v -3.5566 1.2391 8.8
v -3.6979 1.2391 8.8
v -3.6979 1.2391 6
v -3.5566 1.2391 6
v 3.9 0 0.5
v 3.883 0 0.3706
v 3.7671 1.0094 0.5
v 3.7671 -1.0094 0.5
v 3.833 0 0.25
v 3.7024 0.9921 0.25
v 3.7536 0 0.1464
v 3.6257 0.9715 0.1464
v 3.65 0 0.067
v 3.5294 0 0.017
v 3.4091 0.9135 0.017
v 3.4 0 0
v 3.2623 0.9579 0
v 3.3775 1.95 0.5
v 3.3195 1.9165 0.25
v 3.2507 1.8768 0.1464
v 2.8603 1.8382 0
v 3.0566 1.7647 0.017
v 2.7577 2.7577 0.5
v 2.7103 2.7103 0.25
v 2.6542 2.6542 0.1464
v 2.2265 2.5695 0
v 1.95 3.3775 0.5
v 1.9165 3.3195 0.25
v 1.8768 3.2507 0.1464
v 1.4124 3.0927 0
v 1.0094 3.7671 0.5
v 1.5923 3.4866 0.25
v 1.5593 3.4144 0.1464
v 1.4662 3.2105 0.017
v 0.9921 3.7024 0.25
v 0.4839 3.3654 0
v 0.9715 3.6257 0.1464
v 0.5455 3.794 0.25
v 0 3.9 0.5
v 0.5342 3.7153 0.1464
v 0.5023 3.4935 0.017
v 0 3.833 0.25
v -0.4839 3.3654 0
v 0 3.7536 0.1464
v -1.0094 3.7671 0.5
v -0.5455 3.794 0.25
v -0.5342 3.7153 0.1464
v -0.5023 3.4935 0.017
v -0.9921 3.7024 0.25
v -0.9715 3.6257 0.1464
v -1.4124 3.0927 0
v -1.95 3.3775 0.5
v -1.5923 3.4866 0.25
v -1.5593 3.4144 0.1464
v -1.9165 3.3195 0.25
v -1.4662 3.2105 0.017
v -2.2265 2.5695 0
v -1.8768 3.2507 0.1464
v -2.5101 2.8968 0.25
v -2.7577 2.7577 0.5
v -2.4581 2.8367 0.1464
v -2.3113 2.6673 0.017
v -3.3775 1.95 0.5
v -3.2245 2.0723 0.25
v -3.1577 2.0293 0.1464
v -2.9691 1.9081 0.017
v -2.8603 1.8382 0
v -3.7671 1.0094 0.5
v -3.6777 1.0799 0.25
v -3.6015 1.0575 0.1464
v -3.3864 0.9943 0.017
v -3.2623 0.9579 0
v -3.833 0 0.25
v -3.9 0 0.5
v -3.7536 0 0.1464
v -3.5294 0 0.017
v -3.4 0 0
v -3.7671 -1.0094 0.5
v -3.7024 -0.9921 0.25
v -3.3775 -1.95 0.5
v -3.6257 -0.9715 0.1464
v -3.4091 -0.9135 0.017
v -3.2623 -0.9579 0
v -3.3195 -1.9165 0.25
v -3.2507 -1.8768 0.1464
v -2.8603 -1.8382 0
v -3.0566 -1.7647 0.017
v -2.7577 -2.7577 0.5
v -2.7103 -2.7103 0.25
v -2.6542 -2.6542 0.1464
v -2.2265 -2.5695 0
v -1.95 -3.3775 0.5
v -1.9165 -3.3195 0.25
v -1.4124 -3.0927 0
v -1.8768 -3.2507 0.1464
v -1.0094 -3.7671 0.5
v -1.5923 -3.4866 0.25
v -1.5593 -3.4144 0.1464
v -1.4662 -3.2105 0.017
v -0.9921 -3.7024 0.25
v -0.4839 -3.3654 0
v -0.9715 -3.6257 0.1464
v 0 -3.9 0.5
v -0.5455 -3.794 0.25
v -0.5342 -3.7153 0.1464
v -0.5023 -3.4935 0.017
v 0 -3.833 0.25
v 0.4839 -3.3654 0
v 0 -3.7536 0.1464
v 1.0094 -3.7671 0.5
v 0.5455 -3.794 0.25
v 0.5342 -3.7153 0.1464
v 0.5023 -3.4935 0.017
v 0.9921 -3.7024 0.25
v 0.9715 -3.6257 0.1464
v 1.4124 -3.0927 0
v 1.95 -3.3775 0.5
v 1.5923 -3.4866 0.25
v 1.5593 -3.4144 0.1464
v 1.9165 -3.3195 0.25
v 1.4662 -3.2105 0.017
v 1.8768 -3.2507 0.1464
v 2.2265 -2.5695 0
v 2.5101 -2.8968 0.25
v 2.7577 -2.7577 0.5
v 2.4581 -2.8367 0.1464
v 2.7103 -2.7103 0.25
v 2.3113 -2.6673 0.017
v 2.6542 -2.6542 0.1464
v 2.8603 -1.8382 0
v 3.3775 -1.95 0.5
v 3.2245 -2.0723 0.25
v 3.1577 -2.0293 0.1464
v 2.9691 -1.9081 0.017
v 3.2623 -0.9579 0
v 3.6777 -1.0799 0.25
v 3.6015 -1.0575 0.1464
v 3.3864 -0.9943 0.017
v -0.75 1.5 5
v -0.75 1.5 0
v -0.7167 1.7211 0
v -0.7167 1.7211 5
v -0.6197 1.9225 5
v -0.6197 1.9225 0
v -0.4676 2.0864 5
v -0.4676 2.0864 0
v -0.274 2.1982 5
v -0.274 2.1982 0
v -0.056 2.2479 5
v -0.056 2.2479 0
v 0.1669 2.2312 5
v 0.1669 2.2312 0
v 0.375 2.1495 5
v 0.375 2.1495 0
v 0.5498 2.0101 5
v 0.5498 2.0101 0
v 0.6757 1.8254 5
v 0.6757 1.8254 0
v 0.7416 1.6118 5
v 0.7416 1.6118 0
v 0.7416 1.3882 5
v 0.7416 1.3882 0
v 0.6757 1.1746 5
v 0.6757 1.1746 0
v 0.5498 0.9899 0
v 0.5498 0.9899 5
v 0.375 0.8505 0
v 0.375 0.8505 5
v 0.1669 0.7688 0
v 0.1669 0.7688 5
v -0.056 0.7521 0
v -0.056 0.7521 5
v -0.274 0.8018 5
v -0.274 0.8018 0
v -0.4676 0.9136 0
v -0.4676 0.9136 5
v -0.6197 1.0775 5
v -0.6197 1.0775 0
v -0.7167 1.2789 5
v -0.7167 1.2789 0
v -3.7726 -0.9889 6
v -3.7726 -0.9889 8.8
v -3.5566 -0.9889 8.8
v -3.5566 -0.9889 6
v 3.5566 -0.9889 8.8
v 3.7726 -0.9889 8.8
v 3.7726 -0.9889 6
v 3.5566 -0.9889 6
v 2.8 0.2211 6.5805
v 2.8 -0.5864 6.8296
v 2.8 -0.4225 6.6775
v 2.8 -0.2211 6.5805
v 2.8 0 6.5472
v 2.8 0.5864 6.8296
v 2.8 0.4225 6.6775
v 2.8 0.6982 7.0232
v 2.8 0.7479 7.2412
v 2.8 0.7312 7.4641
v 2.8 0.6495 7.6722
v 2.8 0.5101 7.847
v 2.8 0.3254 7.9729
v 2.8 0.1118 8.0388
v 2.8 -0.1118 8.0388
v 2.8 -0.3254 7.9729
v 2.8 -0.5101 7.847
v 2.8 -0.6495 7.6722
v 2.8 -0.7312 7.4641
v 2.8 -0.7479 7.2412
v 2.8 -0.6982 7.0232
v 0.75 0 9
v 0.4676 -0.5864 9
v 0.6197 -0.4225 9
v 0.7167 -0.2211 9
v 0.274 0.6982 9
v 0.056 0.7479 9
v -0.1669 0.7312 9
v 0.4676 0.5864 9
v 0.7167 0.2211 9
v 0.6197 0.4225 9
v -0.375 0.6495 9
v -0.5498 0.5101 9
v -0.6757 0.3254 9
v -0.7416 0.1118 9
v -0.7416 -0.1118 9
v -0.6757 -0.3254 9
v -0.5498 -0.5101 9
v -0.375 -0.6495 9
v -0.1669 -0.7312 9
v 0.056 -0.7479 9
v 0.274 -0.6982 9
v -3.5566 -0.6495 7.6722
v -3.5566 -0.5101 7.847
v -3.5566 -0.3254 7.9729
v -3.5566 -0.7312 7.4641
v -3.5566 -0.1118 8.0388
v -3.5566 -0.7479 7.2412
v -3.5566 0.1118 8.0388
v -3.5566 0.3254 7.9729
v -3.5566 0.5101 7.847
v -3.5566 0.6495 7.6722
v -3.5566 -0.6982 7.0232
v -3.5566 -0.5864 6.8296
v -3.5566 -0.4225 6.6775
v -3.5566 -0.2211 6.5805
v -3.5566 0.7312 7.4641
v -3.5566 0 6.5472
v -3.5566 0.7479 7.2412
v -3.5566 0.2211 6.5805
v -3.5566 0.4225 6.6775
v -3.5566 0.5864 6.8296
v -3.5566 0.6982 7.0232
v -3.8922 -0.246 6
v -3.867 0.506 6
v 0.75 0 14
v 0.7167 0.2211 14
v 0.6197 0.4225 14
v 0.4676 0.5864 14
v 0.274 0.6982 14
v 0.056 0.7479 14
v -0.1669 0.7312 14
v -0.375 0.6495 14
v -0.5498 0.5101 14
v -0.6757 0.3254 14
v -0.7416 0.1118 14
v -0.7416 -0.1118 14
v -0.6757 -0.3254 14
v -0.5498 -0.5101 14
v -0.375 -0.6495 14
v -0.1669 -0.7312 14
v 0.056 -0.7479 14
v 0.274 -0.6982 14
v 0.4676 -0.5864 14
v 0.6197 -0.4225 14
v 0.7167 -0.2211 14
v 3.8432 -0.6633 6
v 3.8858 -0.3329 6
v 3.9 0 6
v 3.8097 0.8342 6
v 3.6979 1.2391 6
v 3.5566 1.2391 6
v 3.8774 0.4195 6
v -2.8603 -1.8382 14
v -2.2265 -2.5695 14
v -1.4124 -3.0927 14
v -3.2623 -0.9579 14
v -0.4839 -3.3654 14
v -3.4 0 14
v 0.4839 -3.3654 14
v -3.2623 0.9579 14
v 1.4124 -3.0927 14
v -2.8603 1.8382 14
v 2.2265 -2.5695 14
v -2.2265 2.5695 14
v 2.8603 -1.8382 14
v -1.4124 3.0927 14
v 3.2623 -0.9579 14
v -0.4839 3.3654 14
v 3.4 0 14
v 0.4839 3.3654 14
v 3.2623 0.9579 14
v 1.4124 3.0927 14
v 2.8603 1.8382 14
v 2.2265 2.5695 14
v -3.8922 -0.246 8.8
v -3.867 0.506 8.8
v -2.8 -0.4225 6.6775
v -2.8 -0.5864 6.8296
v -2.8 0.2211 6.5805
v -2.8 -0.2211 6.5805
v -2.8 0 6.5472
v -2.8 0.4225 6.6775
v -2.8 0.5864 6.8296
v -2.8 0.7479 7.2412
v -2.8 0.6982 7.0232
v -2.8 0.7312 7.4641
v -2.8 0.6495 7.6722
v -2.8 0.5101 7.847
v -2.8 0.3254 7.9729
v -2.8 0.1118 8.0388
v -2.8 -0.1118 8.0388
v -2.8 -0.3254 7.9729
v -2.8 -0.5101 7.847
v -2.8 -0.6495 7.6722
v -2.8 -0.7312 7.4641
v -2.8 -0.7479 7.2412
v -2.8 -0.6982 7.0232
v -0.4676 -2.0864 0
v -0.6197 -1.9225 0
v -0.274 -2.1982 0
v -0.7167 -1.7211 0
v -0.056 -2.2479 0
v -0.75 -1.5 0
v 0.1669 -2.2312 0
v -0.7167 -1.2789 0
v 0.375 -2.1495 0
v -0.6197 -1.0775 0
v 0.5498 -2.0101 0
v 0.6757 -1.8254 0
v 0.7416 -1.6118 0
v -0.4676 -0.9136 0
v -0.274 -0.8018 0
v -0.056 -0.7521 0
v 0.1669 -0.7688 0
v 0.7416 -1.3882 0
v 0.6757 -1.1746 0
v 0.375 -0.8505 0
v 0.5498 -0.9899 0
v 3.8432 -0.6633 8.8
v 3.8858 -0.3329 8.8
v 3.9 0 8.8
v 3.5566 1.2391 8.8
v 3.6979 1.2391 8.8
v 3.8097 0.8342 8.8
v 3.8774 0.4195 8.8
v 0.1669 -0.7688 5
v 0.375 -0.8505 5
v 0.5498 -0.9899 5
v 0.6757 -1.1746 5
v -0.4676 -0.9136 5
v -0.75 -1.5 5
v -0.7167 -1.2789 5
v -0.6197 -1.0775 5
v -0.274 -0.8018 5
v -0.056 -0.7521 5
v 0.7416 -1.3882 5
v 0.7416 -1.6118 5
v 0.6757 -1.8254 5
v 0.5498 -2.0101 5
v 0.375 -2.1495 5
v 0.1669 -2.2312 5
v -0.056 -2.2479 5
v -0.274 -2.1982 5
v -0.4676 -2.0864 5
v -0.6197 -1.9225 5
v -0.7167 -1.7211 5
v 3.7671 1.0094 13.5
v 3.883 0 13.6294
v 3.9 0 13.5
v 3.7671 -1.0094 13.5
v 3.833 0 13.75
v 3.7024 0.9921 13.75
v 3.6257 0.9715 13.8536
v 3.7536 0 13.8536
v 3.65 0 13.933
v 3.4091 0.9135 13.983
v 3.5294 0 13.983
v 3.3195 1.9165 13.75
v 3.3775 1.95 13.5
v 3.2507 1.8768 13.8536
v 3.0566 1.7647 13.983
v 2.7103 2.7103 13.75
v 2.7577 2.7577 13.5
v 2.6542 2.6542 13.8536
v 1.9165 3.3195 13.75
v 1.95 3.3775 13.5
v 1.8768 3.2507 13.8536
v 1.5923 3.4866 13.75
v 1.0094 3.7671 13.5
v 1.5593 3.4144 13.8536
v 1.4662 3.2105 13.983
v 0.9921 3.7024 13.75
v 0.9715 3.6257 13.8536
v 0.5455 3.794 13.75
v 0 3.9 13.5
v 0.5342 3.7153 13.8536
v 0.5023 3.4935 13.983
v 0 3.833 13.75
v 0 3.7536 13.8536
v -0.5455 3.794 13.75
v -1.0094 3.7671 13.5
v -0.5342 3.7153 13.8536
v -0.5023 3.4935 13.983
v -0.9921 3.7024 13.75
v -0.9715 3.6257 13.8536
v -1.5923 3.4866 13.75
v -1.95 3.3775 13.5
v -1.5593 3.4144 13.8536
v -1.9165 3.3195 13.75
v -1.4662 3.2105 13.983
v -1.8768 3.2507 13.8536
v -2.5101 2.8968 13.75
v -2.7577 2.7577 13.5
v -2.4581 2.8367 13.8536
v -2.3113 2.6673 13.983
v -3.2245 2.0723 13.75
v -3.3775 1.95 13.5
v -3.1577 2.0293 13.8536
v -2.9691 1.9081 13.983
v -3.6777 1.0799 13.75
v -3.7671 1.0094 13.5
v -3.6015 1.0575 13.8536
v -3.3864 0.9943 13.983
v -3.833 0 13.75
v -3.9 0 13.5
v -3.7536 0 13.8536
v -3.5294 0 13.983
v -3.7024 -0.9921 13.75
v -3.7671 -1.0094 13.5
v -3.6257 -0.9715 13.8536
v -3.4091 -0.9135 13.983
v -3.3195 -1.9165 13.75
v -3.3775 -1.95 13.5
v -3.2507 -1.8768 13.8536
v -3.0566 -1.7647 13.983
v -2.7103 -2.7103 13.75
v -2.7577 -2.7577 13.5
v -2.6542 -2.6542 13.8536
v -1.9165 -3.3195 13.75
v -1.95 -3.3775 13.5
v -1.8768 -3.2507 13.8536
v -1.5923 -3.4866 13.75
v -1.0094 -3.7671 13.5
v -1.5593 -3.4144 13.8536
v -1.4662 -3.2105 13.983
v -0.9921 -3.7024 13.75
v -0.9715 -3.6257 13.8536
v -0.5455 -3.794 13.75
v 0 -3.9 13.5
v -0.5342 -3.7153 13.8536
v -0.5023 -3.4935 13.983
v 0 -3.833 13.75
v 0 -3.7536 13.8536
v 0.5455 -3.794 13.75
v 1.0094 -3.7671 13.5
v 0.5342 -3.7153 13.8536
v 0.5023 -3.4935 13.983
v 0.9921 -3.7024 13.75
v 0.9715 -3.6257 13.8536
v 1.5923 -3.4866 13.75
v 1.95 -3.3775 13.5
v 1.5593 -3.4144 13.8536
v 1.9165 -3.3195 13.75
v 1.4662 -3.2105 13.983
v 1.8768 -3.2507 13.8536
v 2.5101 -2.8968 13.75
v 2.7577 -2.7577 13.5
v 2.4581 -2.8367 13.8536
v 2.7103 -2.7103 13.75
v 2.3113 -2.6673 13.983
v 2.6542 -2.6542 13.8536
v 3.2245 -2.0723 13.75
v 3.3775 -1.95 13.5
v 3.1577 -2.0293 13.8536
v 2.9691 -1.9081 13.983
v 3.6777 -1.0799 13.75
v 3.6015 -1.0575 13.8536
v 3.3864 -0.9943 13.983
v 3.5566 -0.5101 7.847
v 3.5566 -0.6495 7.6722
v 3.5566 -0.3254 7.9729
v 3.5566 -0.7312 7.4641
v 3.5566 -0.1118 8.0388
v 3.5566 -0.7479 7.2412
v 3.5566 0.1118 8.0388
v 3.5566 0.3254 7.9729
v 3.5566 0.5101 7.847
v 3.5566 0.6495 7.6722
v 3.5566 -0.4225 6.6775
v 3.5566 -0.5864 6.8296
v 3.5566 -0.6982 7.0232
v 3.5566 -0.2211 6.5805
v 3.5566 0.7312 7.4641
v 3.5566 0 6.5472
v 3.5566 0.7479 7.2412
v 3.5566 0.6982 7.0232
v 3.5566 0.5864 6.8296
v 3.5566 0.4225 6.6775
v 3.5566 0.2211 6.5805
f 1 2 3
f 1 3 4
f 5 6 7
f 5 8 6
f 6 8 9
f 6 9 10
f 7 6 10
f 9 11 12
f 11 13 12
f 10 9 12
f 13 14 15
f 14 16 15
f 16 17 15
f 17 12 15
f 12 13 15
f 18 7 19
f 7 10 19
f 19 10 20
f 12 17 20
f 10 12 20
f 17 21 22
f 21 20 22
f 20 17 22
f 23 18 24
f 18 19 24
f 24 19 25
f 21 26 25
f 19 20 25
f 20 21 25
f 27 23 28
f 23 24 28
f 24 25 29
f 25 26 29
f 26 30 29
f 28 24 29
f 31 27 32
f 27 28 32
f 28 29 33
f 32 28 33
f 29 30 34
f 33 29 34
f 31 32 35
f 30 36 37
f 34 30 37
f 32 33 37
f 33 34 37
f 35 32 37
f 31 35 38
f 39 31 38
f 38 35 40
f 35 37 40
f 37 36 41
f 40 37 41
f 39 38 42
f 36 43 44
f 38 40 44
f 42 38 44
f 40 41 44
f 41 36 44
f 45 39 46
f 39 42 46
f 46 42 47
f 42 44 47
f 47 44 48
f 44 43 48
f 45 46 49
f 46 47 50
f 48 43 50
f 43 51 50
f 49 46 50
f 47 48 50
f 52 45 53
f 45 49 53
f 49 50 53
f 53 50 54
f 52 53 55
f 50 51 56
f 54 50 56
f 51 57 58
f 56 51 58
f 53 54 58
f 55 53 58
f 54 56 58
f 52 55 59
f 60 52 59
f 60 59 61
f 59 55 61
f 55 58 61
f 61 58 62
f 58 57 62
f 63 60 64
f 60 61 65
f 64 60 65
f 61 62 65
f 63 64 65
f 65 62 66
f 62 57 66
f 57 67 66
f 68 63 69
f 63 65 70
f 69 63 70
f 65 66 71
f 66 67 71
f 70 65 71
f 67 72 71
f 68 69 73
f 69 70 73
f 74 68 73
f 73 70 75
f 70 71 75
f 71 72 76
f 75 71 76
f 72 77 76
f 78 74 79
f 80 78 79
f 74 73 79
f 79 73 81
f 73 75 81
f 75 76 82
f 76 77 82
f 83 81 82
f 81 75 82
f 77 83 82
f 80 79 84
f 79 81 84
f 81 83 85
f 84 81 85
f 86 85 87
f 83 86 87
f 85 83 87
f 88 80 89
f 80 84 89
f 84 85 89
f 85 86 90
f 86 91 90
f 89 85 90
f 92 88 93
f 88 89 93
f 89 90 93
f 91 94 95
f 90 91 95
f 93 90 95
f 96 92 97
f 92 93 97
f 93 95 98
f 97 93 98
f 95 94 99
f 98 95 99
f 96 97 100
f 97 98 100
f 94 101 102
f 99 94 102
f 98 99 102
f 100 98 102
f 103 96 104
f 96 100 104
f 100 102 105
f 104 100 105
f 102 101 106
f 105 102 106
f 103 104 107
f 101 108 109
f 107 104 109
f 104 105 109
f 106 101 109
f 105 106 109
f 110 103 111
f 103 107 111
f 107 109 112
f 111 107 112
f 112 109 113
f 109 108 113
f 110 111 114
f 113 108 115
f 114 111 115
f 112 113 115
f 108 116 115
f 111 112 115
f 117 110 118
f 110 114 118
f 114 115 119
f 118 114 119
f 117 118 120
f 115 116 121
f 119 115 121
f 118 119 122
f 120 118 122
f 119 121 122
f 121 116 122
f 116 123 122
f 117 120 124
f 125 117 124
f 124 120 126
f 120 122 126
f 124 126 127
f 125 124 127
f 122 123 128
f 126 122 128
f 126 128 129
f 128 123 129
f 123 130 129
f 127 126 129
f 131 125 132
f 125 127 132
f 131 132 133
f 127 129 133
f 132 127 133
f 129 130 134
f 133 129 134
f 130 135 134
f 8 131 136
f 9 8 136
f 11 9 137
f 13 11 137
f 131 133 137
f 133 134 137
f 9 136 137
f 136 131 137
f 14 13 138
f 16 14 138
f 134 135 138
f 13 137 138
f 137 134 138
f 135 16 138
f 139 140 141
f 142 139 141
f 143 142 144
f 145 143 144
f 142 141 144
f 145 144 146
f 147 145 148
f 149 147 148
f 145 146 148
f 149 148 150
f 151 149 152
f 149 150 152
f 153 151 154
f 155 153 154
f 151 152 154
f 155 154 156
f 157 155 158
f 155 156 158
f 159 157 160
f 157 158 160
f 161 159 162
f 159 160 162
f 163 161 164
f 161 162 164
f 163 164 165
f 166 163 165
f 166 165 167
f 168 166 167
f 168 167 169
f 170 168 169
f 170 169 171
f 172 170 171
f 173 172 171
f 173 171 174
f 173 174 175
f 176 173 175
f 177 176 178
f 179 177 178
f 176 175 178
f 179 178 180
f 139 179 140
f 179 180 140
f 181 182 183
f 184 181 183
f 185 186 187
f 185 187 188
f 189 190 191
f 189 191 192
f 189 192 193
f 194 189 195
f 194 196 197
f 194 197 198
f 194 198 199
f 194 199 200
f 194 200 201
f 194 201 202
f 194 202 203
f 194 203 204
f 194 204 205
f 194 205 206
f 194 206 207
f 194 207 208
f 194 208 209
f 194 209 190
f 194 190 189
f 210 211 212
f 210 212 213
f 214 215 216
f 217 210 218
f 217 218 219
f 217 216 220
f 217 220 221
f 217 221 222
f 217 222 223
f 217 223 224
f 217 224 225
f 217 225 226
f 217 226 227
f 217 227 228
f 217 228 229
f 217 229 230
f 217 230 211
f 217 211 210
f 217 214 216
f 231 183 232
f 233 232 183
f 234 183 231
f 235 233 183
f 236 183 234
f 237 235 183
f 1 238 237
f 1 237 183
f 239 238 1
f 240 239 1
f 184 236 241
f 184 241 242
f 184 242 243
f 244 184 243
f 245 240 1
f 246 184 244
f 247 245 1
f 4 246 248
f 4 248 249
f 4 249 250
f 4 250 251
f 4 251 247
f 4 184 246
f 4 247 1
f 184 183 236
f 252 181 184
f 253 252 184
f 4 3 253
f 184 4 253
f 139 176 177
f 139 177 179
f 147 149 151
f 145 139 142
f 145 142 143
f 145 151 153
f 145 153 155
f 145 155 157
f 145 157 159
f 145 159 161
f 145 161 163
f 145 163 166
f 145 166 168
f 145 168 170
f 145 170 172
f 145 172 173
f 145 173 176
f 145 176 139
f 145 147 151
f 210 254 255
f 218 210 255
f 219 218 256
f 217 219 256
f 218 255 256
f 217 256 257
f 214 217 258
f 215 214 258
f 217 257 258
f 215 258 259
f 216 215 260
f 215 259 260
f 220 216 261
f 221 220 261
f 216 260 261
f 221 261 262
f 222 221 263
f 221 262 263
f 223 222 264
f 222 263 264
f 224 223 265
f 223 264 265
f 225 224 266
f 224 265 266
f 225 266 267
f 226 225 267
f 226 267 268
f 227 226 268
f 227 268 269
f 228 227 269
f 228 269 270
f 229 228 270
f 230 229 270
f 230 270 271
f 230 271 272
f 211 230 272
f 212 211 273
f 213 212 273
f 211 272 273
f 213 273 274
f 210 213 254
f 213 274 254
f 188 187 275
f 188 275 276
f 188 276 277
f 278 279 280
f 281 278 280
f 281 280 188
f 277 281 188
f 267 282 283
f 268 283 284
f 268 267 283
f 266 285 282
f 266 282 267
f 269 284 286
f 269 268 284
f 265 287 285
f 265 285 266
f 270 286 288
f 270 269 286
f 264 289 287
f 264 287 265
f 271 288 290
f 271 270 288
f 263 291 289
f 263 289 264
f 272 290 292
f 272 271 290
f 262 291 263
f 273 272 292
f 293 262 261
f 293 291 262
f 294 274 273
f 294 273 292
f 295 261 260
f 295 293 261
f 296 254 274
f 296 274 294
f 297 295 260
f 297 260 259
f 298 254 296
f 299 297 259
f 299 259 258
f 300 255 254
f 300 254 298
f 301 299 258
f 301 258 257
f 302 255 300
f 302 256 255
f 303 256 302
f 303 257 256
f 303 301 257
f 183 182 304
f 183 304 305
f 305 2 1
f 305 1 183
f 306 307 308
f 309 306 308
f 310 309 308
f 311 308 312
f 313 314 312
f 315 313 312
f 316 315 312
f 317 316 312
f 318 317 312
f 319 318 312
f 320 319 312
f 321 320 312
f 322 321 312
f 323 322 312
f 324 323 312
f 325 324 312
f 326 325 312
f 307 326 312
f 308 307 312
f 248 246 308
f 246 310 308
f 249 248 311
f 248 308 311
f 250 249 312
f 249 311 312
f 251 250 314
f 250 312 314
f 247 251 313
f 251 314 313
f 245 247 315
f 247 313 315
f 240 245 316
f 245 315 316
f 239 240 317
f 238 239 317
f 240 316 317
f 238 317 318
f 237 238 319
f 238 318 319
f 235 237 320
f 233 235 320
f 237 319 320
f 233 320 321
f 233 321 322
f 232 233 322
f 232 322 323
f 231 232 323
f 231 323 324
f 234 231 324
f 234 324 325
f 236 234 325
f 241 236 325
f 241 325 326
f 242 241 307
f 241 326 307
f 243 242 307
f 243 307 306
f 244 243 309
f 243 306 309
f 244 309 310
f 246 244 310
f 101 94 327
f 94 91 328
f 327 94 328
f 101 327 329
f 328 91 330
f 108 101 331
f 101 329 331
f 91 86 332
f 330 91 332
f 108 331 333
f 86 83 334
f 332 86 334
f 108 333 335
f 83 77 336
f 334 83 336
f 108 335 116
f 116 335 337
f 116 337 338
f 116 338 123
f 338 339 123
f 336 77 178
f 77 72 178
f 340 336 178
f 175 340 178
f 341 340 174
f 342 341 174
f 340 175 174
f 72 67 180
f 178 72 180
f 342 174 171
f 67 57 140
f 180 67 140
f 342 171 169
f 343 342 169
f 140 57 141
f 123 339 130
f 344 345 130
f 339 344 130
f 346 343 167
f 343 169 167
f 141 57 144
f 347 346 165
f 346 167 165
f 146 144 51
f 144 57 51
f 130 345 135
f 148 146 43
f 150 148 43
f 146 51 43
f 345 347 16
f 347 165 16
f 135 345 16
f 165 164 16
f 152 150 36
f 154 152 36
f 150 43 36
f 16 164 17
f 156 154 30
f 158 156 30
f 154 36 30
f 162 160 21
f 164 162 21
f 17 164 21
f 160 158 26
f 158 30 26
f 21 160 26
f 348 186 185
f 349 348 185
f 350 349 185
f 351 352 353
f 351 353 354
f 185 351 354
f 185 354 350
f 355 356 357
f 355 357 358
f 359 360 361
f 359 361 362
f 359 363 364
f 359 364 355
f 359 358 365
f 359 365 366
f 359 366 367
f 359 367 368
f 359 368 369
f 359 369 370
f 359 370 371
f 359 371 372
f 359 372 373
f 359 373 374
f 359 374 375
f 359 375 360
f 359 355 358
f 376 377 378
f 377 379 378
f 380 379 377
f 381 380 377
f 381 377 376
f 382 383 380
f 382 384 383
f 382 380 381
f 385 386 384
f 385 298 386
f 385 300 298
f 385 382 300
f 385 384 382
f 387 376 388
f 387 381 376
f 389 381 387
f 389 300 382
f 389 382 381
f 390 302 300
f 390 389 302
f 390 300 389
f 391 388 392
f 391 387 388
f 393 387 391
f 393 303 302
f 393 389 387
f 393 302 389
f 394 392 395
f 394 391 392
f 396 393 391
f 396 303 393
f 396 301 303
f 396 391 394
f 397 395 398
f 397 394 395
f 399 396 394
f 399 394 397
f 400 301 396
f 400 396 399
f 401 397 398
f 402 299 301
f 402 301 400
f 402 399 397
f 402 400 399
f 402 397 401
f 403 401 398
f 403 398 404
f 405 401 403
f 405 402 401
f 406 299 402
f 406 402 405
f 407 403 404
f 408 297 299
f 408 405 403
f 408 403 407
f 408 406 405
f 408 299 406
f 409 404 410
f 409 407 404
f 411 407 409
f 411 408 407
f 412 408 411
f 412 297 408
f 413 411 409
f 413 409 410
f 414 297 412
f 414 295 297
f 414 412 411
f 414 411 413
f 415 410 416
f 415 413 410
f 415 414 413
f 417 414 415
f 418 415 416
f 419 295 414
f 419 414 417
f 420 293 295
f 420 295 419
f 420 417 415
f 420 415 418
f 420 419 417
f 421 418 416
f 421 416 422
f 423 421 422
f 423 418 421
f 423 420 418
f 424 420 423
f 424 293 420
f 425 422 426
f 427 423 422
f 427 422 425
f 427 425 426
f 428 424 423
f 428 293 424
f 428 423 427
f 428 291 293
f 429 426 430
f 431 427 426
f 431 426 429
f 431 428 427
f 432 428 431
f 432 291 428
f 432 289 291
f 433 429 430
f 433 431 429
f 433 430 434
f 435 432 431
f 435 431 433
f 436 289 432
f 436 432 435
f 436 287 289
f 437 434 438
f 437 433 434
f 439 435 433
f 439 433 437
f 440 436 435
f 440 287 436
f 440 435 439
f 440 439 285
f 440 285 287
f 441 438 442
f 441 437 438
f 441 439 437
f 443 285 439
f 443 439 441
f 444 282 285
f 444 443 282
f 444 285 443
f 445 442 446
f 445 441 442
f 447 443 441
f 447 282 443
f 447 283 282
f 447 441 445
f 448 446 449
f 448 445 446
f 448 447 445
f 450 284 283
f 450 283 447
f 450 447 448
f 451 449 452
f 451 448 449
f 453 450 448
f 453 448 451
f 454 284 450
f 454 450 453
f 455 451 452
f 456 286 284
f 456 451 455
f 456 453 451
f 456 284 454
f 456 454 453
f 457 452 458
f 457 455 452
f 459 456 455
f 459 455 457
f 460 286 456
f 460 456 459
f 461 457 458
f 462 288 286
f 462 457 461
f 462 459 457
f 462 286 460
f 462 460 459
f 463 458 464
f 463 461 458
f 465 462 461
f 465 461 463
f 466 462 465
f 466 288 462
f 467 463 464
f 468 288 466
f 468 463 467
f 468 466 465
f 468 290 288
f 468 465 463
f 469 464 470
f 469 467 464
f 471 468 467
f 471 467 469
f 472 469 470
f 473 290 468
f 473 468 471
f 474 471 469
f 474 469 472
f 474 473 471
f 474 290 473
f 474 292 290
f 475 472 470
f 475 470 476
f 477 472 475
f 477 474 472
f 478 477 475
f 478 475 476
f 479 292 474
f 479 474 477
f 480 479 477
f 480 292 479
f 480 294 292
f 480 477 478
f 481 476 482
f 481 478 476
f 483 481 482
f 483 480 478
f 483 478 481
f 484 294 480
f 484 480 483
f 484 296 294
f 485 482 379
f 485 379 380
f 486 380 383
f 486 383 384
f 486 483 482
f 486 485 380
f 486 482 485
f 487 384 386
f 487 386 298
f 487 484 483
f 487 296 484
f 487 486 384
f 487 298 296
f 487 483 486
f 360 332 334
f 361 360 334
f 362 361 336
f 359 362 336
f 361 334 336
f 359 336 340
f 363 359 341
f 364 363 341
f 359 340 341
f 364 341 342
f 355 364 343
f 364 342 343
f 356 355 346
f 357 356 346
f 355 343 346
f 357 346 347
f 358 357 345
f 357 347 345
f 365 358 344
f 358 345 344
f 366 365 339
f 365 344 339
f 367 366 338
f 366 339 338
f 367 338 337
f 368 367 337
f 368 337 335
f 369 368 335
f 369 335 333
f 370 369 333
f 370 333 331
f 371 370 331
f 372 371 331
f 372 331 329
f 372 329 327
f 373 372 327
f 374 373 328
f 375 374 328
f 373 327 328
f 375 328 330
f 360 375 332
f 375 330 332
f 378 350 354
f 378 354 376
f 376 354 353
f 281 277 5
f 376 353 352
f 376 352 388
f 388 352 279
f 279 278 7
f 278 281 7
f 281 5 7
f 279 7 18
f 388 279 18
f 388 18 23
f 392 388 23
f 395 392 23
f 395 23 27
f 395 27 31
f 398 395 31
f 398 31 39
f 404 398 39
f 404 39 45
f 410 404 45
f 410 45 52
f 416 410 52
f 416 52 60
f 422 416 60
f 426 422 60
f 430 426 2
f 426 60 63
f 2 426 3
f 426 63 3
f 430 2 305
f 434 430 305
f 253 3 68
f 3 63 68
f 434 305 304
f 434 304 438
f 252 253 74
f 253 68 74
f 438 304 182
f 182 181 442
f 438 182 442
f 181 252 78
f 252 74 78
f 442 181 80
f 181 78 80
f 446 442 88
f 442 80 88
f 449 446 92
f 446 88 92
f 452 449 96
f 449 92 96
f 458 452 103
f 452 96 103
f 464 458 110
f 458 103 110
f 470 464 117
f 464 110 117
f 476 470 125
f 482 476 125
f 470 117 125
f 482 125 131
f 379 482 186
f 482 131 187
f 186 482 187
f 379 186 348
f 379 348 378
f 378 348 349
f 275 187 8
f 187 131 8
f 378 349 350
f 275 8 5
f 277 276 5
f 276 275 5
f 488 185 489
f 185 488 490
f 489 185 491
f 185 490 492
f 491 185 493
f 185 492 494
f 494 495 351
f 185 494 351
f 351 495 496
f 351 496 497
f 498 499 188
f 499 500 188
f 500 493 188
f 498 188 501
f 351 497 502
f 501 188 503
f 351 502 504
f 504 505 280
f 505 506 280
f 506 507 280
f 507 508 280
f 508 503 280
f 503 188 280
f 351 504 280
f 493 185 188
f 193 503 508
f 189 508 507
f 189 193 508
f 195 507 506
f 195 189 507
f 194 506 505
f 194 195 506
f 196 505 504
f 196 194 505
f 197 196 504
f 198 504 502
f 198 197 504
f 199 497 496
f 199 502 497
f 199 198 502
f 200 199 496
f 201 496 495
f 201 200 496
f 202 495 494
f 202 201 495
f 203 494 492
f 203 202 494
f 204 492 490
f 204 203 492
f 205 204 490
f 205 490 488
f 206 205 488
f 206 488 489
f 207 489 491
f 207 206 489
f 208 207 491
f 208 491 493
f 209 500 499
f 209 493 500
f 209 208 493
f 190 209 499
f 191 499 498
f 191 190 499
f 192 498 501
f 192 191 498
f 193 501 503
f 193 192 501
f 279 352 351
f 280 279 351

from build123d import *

# Parameters (mm, degrees)
SKETCH1_R           = 3.9
BOSS_EXTRUDE1_DEPTH = 14
FILLET1_R           = 0.5
SKETCH2_R           = 0.75
CUT_EXTRUDE2_DEPTH  = 5
SKETCH3_R           = 0.75
CUT_EXTRUDE3_DEPTH  = 5
SKETCH4_R           = 0.75
CUT_EXTRUDE4_DEPTH  = 1
SKETCH5_W           = 0.434986795
SKETCH5_H           = 2.227981147
CUT_EXTRUDE5_DEPTH  = 2.8


with BuildPart() as part:
    # Sketch1 → Boss-Extrude1 (new body)
    with BuildSketch(Plane.XY):
        Circle(SKETCH1_R)
    extrude(amount=BOSS_EXTRUDE1_DEPTH)

    # Fillet1
    fillet1_edges = [part.edges().sort_by_distance(p)[0] for p in [
        (-3.9, 0, 0),
        (-3.9, 0, 14),
    ]]
    fillet(fillet1_edges, radius=FILLET1_R)

    # Sketch2 → Cut-Extrude2 (cut)
    with BuildSketch(Plane.XY.offset(14)):
        Circle(SKETCH2_R)
    extrude(amount=-CUT_EXTRUDE2_DEPTH, mode=Mode.SUBTRACT)

    # Sketch3 → Cut-Extrude3 (cut)
    with BuildSketch(Plane(origin=(0, 0, 0), x_dir=(-1, 0, 0), z_dir=(0, 0, -1))):
        with Locations((0, 1.5)):
            Circle(SKETCH3_R)
        with Locations((0, -1.5)):
            Circle(SKETCH3_R)
    extrude(amount=-CUT_EXTRUDE3_DEPTH, mode=Mode.SUBTRACT)

    # Sketch4 → Cut-Extrude4 (cut, symmetric)
    with BuildSketch(Plane(origin=(-3.8, 0, 0), x_dir=(0, 0, -1), z_dir=(1, 0, 0))):
        with Locations((-7.297217633, 0)):
            Circle(SKETCH4_R)
    cut_extrude4 = extrude(amount=CUT_EXTRUDE4_DEPTH, both=True, mode=Mode.SUBTRACT)

    # Sketch5 → Cut-Extrude5 (cut)
    with BuildSketch(Plane.XY.offset(6)):
        with Locations((-3.774117143, 0.125124808)):
            Rectangle(SKETCH5_W, SKETCH5_H)
    cut_extrude5 = extrude(amount=CUT_EXTRUDE5_DEPTH, mode=Mode.SUBTRACT)

    # Mirror1: Cut-Extrude4, Cut-Extrude5 across plane
    add(cut_extrude4.mirror(Plane(origin=(0, 0, 0), x_dir=(0, 0, 1), z_dir=(1, 0, 0))), mode=Mode.SUBTRACT)
    add(cut_extrude5.mirror(Plane(origin=(0, 0, 0), x_dir=(0, 0, 1), z_dir=(1, 0, 0))), mode=Mode.SUBTRACT)


solid = part.part
